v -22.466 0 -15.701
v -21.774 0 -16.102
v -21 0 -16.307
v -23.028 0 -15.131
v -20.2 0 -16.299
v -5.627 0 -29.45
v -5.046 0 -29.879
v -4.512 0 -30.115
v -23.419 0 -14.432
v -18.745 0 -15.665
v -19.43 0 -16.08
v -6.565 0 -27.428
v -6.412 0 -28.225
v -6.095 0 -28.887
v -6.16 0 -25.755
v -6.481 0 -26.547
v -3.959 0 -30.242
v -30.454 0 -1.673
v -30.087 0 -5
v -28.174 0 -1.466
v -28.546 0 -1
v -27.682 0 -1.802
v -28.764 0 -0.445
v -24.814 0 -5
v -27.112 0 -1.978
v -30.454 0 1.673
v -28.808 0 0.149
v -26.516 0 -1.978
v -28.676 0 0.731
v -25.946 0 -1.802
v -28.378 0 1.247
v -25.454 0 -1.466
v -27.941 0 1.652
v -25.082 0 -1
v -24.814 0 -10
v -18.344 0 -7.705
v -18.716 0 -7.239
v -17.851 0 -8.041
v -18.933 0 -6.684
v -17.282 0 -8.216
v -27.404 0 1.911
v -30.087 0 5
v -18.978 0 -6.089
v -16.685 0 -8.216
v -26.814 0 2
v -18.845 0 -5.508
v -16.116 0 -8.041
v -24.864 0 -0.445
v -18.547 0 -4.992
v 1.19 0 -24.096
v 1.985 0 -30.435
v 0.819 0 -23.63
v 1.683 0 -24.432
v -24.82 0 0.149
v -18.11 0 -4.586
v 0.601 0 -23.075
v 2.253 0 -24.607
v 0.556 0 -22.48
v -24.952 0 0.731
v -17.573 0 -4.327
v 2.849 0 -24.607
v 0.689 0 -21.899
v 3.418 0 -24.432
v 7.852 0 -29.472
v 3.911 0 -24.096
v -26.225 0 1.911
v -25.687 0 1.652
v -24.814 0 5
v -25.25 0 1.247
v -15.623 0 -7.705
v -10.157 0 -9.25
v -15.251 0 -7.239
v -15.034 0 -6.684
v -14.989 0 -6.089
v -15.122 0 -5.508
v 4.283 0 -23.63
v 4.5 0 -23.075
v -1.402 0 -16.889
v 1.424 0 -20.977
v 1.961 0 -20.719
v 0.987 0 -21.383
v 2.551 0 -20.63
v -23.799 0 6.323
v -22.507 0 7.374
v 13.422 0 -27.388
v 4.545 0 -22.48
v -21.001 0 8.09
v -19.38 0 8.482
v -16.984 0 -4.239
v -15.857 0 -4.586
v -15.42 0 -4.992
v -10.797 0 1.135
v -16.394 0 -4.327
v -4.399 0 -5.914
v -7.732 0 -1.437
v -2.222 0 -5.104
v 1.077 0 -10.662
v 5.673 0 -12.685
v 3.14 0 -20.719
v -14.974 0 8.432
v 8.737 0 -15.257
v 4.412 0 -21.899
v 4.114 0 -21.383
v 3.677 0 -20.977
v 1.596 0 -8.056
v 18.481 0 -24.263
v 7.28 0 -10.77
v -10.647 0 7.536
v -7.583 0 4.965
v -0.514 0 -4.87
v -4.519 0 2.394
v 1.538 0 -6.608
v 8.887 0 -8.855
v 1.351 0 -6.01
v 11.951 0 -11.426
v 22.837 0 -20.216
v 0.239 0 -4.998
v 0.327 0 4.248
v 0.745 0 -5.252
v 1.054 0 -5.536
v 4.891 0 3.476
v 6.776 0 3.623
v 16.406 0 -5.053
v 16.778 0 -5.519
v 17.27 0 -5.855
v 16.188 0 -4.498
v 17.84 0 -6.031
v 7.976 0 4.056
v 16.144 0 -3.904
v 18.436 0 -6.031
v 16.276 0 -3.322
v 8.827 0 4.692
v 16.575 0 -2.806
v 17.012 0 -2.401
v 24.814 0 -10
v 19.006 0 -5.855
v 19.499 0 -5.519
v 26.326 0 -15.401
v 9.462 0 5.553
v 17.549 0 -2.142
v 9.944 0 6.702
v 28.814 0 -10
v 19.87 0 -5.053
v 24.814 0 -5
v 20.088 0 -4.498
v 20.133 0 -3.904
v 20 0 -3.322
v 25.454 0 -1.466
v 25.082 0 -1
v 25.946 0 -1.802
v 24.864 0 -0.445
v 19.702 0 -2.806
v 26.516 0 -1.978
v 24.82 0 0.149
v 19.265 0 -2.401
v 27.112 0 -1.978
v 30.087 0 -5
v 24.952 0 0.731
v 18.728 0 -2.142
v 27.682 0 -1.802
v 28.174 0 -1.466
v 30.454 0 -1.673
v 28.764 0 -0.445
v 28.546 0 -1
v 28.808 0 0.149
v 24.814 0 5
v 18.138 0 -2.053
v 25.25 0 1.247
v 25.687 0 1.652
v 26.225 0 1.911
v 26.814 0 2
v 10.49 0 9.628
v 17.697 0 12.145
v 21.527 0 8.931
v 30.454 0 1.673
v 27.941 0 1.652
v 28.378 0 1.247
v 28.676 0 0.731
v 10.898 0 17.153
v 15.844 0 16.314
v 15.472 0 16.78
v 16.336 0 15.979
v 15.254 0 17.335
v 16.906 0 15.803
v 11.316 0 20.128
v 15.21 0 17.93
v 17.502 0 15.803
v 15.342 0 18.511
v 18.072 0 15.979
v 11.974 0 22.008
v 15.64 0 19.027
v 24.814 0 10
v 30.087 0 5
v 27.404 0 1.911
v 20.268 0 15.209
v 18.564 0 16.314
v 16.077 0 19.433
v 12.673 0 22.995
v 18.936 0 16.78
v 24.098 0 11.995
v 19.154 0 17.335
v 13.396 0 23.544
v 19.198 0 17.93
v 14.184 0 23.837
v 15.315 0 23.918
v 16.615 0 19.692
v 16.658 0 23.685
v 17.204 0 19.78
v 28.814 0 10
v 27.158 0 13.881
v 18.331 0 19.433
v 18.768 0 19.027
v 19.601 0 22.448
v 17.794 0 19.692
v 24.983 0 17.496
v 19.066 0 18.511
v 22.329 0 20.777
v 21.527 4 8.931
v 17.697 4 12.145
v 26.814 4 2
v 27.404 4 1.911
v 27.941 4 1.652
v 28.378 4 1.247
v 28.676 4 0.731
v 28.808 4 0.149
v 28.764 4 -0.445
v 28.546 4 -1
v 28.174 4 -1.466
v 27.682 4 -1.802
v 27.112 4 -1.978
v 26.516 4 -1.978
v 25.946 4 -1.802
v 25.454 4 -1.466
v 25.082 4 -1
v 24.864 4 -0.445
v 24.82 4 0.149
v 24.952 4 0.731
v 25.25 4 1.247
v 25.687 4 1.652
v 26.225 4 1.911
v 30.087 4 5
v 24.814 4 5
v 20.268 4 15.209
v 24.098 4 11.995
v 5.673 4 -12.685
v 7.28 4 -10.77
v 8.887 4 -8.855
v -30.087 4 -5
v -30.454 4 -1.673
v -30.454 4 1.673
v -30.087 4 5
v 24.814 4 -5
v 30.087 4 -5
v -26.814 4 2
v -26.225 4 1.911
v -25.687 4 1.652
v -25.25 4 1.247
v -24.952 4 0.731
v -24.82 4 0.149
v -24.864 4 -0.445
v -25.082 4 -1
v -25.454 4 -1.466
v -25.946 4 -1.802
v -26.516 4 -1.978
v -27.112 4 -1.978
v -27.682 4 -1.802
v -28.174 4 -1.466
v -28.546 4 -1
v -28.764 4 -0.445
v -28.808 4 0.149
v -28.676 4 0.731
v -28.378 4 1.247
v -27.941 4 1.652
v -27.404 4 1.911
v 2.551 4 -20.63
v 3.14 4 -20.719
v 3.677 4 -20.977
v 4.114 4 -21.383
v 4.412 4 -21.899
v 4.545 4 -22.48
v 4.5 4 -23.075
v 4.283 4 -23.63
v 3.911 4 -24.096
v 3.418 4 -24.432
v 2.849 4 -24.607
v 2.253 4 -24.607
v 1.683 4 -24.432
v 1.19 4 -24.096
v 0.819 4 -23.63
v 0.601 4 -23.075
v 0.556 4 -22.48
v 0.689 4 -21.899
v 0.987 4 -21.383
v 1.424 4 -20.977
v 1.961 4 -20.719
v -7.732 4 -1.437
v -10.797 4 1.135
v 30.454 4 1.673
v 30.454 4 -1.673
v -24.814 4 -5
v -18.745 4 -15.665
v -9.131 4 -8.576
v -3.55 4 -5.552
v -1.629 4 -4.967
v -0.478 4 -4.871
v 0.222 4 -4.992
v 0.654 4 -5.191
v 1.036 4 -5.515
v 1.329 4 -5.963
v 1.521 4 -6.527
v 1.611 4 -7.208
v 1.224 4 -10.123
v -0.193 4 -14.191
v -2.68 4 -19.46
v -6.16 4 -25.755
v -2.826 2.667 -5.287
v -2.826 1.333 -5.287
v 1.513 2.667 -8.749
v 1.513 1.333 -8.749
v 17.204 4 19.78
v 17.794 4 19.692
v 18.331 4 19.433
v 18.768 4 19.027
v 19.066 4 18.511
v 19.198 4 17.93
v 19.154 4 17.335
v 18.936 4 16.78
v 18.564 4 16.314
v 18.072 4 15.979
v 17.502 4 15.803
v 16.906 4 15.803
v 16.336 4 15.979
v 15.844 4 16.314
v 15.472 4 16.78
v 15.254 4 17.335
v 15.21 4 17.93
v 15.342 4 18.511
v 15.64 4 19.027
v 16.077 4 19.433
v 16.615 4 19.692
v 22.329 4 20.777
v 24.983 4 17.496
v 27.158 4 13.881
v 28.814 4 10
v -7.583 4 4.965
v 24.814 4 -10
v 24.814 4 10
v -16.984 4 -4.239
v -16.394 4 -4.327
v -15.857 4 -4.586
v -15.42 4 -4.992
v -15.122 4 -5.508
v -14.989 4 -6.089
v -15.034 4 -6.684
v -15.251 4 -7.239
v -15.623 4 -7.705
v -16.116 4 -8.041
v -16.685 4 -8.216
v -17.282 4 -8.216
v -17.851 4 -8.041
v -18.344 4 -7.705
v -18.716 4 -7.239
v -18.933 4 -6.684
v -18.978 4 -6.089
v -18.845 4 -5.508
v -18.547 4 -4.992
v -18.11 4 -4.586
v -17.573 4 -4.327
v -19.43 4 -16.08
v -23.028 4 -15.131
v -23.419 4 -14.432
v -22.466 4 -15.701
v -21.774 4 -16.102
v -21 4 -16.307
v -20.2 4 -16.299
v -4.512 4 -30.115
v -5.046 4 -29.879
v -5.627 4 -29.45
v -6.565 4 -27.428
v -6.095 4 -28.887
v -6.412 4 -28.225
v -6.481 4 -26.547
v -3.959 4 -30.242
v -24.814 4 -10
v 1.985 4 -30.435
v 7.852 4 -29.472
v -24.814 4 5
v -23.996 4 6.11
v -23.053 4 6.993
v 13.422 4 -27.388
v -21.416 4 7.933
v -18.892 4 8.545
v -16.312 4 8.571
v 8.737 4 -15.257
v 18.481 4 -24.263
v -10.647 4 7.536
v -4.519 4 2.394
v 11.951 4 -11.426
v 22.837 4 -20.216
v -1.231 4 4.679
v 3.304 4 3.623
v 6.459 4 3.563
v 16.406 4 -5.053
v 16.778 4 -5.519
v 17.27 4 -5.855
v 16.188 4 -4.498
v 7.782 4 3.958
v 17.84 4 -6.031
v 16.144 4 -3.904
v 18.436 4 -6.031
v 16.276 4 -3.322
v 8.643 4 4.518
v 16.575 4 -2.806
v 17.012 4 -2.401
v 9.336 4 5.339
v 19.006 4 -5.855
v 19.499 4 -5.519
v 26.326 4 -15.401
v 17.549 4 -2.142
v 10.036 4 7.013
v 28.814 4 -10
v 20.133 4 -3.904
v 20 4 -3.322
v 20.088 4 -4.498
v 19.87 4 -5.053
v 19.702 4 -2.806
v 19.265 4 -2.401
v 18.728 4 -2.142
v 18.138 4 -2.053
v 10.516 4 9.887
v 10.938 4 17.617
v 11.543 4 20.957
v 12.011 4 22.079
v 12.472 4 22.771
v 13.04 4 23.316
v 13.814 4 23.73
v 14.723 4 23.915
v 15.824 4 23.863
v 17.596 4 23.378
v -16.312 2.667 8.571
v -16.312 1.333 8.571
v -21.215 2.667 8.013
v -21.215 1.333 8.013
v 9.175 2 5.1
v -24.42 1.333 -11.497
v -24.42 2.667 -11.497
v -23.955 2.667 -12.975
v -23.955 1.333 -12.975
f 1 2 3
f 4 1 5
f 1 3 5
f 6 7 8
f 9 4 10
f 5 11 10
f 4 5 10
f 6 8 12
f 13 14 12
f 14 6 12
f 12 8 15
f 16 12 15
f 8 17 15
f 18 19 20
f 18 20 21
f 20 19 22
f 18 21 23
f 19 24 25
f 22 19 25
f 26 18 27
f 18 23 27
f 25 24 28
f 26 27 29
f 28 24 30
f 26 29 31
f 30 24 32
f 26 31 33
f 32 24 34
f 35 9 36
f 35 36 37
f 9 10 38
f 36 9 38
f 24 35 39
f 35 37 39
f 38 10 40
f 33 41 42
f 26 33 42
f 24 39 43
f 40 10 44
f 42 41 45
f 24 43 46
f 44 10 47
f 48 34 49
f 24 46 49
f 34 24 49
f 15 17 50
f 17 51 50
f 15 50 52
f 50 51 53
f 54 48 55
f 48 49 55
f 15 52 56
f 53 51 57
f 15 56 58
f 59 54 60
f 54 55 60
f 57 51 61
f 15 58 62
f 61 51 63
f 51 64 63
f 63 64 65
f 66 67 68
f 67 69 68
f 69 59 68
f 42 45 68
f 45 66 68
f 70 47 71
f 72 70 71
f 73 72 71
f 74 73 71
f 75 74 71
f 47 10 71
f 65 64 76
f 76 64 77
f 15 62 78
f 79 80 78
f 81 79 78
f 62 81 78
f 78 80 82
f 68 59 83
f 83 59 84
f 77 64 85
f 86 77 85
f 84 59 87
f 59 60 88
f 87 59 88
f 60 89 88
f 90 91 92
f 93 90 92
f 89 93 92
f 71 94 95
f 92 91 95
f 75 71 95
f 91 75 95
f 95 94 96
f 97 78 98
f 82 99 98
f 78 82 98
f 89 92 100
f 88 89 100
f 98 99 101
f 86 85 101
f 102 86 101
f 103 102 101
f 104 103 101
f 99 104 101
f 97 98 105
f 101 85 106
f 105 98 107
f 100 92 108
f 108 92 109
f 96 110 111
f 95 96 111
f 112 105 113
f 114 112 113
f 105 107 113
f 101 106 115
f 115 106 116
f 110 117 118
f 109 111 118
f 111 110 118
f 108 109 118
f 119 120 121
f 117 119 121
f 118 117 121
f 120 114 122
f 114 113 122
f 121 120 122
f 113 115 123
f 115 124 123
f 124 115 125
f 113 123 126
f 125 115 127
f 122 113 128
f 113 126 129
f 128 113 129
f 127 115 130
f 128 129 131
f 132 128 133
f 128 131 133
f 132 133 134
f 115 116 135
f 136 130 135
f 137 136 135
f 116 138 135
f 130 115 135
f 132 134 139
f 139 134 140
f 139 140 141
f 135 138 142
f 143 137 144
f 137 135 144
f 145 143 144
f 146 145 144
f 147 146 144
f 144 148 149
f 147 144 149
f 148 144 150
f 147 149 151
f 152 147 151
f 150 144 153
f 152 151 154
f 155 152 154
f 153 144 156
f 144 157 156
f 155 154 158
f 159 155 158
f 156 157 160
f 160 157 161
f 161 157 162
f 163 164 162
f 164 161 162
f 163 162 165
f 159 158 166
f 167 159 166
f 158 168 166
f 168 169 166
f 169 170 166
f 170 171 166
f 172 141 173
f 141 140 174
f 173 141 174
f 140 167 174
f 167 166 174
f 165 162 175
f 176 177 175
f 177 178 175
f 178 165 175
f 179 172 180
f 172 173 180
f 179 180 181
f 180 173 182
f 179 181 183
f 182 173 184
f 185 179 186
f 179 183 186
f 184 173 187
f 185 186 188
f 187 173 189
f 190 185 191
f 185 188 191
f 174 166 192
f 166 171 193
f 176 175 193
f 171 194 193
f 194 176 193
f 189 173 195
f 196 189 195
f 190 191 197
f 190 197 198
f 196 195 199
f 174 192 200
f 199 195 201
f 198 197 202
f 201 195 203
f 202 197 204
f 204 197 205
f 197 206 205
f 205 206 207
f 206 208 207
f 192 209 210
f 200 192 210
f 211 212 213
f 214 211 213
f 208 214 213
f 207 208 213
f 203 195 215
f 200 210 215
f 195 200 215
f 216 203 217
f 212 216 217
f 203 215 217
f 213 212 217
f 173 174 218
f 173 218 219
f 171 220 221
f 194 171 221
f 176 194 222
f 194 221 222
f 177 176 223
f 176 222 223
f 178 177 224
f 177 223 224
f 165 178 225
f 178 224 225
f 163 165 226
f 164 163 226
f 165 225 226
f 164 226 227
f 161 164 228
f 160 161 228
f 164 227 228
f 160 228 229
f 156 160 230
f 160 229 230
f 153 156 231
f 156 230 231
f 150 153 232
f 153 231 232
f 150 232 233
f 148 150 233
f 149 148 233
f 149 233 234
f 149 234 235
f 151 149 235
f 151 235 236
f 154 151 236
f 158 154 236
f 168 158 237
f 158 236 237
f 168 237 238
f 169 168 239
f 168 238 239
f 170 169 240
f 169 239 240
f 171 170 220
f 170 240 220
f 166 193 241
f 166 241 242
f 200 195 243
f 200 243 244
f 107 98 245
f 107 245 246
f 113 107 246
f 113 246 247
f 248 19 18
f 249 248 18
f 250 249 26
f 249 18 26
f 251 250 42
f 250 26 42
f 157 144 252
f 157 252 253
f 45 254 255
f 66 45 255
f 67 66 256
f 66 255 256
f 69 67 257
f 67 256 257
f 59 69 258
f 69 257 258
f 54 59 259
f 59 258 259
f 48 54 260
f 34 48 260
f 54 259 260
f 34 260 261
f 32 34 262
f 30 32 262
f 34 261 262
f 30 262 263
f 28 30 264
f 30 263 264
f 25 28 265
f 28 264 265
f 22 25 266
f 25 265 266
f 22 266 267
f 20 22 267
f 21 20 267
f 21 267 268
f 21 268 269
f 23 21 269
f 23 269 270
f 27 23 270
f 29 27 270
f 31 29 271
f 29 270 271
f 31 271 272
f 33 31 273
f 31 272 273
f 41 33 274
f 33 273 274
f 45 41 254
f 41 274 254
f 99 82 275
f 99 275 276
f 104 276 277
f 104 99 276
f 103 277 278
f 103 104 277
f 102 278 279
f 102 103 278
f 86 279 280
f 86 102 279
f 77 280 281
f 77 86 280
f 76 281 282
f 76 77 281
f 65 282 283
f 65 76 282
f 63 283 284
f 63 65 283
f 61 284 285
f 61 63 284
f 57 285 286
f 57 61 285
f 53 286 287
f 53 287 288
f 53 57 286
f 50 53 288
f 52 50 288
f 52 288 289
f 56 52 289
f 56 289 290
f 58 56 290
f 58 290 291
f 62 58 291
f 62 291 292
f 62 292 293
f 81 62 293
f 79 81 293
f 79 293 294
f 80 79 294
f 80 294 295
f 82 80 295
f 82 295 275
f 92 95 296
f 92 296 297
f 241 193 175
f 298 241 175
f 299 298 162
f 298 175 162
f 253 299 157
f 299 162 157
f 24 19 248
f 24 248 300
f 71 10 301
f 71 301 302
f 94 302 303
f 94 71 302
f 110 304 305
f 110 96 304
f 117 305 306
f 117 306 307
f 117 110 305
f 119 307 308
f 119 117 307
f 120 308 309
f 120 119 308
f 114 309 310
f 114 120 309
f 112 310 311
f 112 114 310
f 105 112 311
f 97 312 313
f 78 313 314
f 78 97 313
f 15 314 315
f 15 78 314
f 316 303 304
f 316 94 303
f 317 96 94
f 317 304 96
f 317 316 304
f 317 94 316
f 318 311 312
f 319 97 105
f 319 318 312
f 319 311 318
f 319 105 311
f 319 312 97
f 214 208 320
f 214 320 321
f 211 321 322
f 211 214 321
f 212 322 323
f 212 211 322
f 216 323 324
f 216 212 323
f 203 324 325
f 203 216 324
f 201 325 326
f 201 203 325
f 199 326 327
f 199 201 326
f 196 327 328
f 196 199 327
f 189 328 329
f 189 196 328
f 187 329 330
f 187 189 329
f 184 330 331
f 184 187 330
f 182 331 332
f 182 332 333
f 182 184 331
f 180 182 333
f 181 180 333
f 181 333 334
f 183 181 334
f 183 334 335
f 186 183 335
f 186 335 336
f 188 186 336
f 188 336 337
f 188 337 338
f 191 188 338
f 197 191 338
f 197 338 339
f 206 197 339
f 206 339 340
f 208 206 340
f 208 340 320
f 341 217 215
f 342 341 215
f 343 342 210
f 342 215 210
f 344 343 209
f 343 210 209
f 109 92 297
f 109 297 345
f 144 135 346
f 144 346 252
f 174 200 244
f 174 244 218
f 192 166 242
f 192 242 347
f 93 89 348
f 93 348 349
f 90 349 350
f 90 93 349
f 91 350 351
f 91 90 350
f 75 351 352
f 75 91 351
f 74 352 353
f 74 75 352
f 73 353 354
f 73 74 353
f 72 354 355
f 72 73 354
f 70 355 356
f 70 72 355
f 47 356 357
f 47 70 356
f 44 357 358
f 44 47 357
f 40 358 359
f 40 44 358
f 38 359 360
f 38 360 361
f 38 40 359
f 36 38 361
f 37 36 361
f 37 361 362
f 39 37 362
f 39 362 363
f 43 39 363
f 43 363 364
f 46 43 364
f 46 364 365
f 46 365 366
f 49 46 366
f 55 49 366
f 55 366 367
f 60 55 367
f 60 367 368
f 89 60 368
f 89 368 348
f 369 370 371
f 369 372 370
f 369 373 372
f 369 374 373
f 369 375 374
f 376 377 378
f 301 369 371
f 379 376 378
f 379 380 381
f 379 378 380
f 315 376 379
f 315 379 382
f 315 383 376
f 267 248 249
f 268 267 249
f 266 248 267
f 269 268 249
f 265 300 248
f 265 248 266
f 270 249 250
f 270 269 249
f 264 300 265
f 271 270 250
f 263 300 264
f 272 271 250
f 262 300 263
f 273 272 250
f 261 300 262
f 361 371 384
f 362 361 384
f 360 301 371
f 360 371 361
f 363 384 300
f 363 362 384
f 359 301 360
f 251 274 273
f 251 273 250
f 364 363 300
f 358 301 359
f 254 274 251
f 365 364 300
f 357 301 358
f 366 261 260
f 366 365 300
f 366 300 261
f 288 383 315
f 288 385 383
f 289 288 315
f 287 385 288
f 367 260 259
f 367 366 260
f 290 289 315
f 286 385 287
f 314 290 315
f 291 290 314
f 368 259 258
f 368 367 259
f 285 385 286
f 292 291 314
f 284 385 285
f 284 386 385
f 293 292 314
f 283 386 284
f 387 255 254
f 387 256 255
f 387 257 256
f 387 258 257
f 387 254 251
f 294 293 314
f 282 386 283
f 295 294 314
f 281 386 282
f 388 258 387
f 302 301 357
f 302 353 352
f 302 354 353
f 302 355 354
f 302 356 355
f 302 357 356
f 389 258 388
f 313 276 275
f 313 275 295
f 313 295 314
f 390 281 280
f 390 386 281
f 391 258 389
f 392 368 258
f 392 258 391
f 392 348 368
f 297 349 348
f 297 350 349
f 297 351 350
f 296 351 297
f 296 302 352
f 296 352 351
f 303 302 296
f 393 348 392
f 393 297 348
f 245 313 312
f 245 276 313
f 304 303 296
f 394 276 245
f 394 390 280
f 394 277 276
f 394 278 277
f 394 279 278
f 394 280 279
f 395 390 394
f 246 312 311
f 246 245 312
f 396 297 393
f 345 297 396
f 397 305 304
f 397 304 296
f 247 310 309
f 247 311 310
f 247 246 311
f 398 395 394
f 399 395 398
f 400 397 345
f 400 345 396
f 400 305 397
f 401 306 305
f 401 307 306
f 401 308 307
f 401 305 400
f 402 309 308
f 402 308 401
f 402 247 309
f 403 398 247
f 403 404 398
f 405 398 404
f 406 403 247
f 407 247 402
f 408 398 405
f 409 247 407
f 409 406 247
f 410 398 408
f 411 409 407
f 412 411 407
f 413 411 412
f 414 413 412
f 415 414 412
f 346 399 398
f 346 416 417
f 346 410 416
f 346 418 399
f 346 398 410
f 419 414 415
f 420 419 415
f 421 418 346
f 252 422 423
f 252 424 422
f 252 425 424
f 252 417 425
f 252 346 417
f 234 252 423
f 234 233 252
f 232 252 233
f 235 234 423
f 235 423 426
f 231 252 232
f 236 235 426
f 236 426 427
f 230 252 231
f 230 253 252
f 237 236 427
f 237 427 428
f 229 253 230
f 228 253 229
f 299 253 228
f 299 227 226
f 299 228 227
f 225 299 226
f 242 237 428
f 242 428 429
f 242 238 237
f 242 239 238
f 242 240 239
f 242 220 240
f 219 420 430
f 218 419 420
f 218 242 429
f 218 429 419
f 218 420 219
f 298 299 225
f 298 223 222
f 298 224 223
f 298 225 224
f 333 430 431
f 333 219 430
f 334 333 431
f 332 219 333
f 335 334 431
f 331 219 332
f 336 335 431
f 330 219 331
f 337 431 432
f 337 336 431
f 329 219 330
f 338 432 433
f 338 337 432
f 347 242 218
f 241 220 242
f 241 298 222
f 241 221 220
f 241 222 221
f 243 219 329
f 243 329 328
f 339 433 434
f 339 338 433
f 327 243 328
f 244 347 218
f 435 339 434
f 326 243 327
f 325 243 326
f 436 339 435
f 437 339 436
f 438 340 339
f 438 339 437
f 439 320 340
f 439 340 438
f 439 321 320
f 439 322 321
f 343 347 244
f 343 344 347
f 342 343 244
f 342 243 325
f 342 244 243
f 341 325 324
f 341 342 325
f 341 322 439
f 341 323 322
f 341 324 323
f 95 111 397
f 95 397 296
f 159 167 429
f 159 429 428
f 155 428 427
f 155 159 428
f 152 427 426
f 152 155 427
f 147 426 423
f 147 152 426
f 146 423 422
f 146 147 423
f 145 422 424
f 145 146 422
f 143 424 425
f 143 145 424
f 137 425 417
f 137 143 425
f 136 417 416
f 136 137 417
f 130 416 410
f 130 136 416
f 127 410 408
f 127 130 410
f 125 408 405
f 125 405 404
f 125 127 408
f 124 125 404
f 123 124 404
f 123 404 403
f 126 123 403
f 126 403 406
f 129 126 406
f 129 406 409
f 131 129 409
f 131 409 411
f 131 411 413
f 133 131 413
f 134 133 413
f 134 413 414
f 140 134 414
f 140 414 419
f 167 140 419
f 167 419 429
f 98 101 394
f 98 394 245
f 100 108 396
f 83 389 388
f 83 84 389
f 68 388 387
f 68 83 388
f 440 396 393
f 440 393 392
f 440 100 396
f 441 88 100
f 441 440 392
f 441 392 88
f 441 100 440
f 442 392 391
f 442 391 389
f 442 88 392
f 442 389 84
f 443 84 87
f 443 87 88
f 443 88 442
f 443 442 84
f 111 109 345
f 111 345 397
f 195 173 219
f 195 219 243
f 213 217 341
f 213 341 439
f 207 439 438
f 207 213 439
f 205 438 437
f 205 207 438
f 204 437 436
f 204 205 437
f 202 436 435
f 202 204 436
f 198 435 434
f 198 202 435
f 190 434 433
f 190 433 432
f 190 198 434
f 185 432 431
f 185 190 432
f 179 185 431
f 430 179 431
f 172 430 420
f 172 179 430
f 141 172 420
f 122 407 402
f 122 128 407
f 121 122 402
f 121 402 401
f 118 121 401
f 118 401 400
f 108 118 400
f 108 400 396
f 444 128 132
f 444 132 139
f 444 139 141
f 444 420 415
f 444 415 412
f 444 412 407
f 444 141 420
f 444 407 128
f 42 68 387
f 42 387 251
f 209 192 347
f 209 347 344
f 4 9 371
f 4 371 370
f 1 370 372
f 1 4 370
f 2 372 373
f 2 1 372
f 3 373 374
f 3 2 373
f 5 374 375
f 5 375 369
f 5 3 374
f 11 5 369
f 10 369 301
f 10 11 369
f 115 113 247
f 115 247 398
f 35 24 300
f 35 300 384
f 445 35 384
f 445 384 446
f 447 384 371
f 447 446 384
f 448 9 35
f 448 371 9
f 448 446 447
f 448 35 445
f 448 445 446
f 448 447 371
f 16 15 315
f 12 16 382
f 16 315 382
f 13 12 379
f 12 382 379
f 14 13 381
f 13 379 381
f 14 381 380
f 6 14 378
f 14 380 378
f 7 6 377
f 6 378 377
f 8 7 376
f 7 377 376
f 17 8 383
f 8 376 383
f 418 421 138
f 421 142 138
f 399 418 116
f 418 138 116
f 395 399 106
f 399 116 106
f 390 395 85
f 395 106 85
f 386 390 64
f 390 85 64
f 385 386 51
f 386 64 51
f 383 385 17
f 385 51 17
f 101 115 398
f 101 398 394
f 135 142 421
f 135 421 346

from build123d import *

# Parameters (mm, degrees)
CROQUIS1_R              = 30.5
SALIENTE_EXTRUIR1_DEPTH = 4
CORTAR_EXTRUIR3_START   = -4
CORTAR_EXTRUIR3_DEPTH   = 4
CORTAR_EXTRUIR6_START   = -10
CROQUIS9_R              = 2
CORTAR_EXTRUIR6_DEPTH   = 10
REDONDEO1_R             = 3
CROQUIS10_R             = 2
CORTAR_EXTRUIR7_DEPTH   = 4


with BuildPart() as part:
    # Croquis1 → Saliente-Extruir1 (new body)
    with BuildSketch(Plane(origin=(0, 0, 0), x_dir=(1, 0, 0), z_dir=(0, 1, 0))):
        with Locations(Location((0, 0, 0), (0, 0, 270))):
            Circle(CROQUIS1_R)
    extrude(amount=SALIENTE_EXTRUIR1_DEPTH)

    # Croquis5 → Cortar-Extruir3 (cut)
    with BuildSketch(Plane(origin=(0, 4, 0), x_dir=(1, 0, 0), z_dir=(0, 1, 0)).offset(CORTAR_EXTRUIR3_START)):
        with BuildLine():
            Line((28.814059068, 5), (30.087372767, 5))
            ThreePointArc((30.087372767, 5), (29.556634924, 7.526973624), (28.814059068, 10))
            Line((28.814059068, 10), (24.814059068, 10))
            Line((24.814059068, 10), (24.814059068, 5))
            Line((24.814059068, 5), (28.814059068, 5))
        make_face()
        with BuildLine():
            Line((30.087372767, -5), (28.814059068, -5))
            Line((28.814059068, -5), (24.814059068, -5))
            Line((24.814059068, -5), (24.814059068, -10))
            Line((24.814059068, -10), (28.814059068, -10))
            ThreePointArc((28.814059068, -10), (29.556634924, -7.526973624), (30.087372767, -5))
        make_face()
        with BuildLine():
            Line((-24.814059068, 5), (-24.814059068, 10))
            Line((-24.814059068, 10), (-28.814059068, 10))
            ThreePointArc((-28.814059068, 10), (-29.556634924, 7.526973624), (-30.087372767, 5))
            Line((-30.087372767, 5), (-28.814059068, 5))
            Line((-28.814059068, 5), (-24.814059068, 5))
        make_face()
        with BuildLine():
            Line((-28.814059068, -10), (-24.814059068, -10))
            Line((-24.814059068, -10), (-24.814059068, -5))
            Line((-24.814059068, -5), (-28.814059068, -5))
            Line((-28.814059068, -5), (-30.087372767, -5))
            ThreePointArc((-30.087372767, -5), (-29.556634924, -7.526973624), (-28.814059068, -10))
        make_face()
    extrude(amount=CORTAR_EXTRUIR3_DEPTH, mode=Mode.SUBTRACT)

    # Croquis9 → Cortar-Extruir6 (cut)
    with BuildSketch(Plane(origin=(0, 4, 0), x_dir=(1, 0, 0), z_dir=(0, 1, 0)).offset(CORTAR_EXTRUIR6_START)):
        Polygon((5.673284852, 12.685390231), (7.280253876, 10.770279124), (8.887222901, 8.855168016), (11.951400673, 11.426318455), (8.737462625, 15.25654067), align=None)
        Polygon((-10.796670675, -1.134543377), (-7.582732627, -4.964765592), (-4.518554854, -2.393615154), (-7.732492903, 1.436607062), align=None)
        with BuildLine():
            add(Edge.make_bspline(
                [(-10.646910399, -7.535916031), (-16.512406299, -9.080989315), (-22.046756553, -9.526586799), (-24.814059068, -5)],
                knots=[0.7678792, 0.7678792, 0.7678792, 0.7678792, 1, 1, 1, 1], degree=3))
            Line((-24.814059068, -5), (-24.814059068, -10))
            Line((-24.814059068, -10), (-28.814059068, -10))
            ThreePointArc((-28.814059068, -10), (-6.288730728, -29.84462876), (22.328940845, -20.776631121))
            add(Edge.make_bspline(
                [(22.328940845, -20.776631121), (5.973751648, -31.851207958), (18.415722084, 4.766196666), (-2.50799159, -5.391983749), (-10.646910399, -7.535916031)],
                knots=[0, 0, 0, 0, 0.445790092, 0.7678792, 0.7678792, 0.7678792, 0.7678792], degree=3))
        make_face()
        with BuildLine():
            add(Edge.make_bspline(
                [(-18.745320889, 15.664553597), (3.867000935, -2.576496257), (8.094246487, 2.496379136), (-8.307345659, 29.346856869)],
                knots=[0.040527546, 0.040527546, 0.040527546, 0.040527546, 1, 1, 1, 1], degree=3))
            ThreePointArc((-8.307345659, 29.346856869), (-20.930238649, 22.185019948), (-28.814059068, 10))
            Line((-28.814059068, 10), (-24.814059068, 10))
            add(Edge.make_bspline(
                [(-24.814059068, 10), (-24.456478323, 11.504954743), (-23.99064654, 12.985671633), (-23.418905183, 14.432273611)],
                knots=[0.635079884, 0.635079884, 0.635079884, 0.635079884, 0.831813486, 0.831813486, 0.831813486, 0.831813486], degree=3))
            ThreePointArc((-23.418905183, 14.432273611), (-21.393777069, 16.230440533), (-18.745320889, 15.664553597))
        make_face()
        Polygon((21.527275636, -8.931176939), (17.69705342, -12.145114987), (20.268203859, -15.20929276), (24.098426074, -11.995354711), align=None)
        with Locations(Location((2.550631881, 22.629718435, 0), (0, 0, 270))):
            Circle(CROQUIS9_R)
        with Locations(Location((18.138231416, 4.05314069, 0), (0, 0, 270))):
            Circle(CROQUIS9_R)
        with Locations(Location((-16.983501418, 6.238634388, 0), (0, 0, 270))):
            Circle(CROQUIS9_R)
        with Locations(Location((17.204026086, -17.780443199, 0), (0, 0, 270))):
            Circle(CROQUIS9_R)
    extrude(amount=CORTAR_EXTRUIR6_DEPTH, mode=Mode.SUBTRACT)

    # Redondeo1
    redondeo1_edges = [part.edges().sort_by_distance(p)[0] for p in [
        (-8.307345659, 2, -29.346856869),
    ]]
    fillet(redondeo1_edges, radius=REDONDEO1_R)

    # Croquis10 → Cortar-Extruir7 (cut)
    with BuildSketch(Plane(origin=(0, 4, 0), x_dir=(1, 0, 0), z_dir=(0, 1, 0))):
        with Locations(Location((-26.814059068, 0, 0), (0, 0, 270))):
            Circle(CROQUIS10_R)
        with Locations(Location((26.814059068, 0, 0), (0, 0, 270))):
            Circle(CROQUIS10_R)
    extrude(amount=-CORTAR_EXTRUIR7_DEPTH, mode=Mode.SUBTRACT)


solid = part.part
